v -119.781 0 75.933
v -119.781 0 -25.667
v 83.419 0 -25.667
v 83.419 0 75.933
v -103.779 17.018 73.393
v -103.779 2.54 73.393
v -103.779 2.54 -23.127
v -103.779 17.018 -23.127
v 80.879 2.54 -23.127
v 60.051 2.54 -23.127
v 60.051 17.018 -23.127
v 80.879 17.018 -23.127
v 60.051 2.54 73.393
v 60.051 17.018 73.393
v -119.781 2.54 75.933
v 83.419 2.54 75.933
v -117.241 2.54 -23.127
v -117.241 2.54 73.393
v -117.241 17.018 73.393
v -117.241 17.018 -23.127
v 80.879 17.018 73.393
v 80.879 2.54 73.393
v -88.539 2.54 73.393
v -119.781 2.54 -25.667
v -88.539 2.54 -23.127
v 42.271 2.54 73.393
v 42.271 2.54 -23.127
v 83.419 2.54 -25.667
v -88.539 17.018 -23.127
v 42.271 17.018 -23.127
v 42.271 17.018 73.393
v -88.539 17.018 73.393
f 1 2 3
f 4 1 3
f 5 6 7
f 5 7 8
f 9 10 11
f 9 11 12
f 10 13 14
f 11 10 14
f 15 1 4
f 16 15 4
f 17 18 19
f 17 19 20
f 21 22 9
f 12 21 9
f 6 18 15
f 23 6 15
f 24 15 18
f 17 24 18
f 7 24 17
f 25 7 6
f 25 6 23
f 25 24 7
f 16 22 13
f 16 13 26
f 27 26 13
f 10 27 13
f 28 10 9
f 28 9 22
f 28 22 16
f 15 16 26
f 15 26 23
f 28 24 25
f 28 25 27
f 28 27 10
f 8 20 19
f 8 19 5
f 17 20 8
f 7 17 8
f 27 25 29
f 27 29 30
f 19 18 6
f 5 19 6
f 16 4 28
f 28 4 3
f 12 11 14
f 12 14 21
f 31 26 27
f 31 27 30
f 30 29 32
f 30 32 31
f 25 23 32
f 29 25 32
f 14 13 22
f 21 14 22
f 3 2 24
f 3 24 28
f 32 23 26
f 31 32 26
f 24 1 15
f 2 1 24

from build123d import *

# Parameters (mm, degrees)
SKETCH1_W           = 203.2
SKETCH1_H           = 101.6
BOSS_EXTRUDE1_DEPTH = 2.54
SKETCH2_W           = 198.12
SKETCH2_H           = 96.52
BOSS_EXTRUDE2_DEPTH = 14.478
SKETCH4_W           = 17.78
SKETCH4_H           = 14.478
SKETCH4_W_2         = 15.24
CUT_EXTRUDE6_DEPTH  = 101.6


with BuildPart() as part:
    # Sketch1 → Boss-Extrude1 (new body)
    with BuildSketch(Plane(origin=(0, 0, 0), x_dir=(1, 0, 0), z_dir=(0, 1, 0))):
        with Locations((-18.181052632, -25.132631579)):
            Rectangle(SKETCH1_W, SKETCH1_H)
    extrude(amount=BOSS_EXTRUDE1_DEPTH)

    # Sketch2 → Boss-Extrude2 (add)
    with BuildSketch(Plane(origin=(0, 2.54, 0), x_dir=(1, 0, 0), z_dir=(0, 1, 0))):
        with Locations((-18.181052632, -25.132631579)):
            Rectangle(SKETCH2_W, SKETCH2_H)
    extrude(amount=BOSS_EXTRUDE2_DEPTH)

    # Sketch4 → Cut-Extrude6 (cut)
    with BuildSketch(Plane(origin=(0, 0, -23.127368421), x_dir=(-1, 0, 0), z_dir=(0, 0, -1))):
        with Locations((-51.160947368, 9.779)):
            Rectangle(SKETCH4_W, SKETCH4_H)
        with Locations((96.159052632, 9.779)):
            Rectangle(SKETCH4_W_2, SKETCH4_H)
    extrude(amount=-CUT_EXTRUDE6_DEPTH, mode=Mode.SUBTRACT)


solid = part.part
